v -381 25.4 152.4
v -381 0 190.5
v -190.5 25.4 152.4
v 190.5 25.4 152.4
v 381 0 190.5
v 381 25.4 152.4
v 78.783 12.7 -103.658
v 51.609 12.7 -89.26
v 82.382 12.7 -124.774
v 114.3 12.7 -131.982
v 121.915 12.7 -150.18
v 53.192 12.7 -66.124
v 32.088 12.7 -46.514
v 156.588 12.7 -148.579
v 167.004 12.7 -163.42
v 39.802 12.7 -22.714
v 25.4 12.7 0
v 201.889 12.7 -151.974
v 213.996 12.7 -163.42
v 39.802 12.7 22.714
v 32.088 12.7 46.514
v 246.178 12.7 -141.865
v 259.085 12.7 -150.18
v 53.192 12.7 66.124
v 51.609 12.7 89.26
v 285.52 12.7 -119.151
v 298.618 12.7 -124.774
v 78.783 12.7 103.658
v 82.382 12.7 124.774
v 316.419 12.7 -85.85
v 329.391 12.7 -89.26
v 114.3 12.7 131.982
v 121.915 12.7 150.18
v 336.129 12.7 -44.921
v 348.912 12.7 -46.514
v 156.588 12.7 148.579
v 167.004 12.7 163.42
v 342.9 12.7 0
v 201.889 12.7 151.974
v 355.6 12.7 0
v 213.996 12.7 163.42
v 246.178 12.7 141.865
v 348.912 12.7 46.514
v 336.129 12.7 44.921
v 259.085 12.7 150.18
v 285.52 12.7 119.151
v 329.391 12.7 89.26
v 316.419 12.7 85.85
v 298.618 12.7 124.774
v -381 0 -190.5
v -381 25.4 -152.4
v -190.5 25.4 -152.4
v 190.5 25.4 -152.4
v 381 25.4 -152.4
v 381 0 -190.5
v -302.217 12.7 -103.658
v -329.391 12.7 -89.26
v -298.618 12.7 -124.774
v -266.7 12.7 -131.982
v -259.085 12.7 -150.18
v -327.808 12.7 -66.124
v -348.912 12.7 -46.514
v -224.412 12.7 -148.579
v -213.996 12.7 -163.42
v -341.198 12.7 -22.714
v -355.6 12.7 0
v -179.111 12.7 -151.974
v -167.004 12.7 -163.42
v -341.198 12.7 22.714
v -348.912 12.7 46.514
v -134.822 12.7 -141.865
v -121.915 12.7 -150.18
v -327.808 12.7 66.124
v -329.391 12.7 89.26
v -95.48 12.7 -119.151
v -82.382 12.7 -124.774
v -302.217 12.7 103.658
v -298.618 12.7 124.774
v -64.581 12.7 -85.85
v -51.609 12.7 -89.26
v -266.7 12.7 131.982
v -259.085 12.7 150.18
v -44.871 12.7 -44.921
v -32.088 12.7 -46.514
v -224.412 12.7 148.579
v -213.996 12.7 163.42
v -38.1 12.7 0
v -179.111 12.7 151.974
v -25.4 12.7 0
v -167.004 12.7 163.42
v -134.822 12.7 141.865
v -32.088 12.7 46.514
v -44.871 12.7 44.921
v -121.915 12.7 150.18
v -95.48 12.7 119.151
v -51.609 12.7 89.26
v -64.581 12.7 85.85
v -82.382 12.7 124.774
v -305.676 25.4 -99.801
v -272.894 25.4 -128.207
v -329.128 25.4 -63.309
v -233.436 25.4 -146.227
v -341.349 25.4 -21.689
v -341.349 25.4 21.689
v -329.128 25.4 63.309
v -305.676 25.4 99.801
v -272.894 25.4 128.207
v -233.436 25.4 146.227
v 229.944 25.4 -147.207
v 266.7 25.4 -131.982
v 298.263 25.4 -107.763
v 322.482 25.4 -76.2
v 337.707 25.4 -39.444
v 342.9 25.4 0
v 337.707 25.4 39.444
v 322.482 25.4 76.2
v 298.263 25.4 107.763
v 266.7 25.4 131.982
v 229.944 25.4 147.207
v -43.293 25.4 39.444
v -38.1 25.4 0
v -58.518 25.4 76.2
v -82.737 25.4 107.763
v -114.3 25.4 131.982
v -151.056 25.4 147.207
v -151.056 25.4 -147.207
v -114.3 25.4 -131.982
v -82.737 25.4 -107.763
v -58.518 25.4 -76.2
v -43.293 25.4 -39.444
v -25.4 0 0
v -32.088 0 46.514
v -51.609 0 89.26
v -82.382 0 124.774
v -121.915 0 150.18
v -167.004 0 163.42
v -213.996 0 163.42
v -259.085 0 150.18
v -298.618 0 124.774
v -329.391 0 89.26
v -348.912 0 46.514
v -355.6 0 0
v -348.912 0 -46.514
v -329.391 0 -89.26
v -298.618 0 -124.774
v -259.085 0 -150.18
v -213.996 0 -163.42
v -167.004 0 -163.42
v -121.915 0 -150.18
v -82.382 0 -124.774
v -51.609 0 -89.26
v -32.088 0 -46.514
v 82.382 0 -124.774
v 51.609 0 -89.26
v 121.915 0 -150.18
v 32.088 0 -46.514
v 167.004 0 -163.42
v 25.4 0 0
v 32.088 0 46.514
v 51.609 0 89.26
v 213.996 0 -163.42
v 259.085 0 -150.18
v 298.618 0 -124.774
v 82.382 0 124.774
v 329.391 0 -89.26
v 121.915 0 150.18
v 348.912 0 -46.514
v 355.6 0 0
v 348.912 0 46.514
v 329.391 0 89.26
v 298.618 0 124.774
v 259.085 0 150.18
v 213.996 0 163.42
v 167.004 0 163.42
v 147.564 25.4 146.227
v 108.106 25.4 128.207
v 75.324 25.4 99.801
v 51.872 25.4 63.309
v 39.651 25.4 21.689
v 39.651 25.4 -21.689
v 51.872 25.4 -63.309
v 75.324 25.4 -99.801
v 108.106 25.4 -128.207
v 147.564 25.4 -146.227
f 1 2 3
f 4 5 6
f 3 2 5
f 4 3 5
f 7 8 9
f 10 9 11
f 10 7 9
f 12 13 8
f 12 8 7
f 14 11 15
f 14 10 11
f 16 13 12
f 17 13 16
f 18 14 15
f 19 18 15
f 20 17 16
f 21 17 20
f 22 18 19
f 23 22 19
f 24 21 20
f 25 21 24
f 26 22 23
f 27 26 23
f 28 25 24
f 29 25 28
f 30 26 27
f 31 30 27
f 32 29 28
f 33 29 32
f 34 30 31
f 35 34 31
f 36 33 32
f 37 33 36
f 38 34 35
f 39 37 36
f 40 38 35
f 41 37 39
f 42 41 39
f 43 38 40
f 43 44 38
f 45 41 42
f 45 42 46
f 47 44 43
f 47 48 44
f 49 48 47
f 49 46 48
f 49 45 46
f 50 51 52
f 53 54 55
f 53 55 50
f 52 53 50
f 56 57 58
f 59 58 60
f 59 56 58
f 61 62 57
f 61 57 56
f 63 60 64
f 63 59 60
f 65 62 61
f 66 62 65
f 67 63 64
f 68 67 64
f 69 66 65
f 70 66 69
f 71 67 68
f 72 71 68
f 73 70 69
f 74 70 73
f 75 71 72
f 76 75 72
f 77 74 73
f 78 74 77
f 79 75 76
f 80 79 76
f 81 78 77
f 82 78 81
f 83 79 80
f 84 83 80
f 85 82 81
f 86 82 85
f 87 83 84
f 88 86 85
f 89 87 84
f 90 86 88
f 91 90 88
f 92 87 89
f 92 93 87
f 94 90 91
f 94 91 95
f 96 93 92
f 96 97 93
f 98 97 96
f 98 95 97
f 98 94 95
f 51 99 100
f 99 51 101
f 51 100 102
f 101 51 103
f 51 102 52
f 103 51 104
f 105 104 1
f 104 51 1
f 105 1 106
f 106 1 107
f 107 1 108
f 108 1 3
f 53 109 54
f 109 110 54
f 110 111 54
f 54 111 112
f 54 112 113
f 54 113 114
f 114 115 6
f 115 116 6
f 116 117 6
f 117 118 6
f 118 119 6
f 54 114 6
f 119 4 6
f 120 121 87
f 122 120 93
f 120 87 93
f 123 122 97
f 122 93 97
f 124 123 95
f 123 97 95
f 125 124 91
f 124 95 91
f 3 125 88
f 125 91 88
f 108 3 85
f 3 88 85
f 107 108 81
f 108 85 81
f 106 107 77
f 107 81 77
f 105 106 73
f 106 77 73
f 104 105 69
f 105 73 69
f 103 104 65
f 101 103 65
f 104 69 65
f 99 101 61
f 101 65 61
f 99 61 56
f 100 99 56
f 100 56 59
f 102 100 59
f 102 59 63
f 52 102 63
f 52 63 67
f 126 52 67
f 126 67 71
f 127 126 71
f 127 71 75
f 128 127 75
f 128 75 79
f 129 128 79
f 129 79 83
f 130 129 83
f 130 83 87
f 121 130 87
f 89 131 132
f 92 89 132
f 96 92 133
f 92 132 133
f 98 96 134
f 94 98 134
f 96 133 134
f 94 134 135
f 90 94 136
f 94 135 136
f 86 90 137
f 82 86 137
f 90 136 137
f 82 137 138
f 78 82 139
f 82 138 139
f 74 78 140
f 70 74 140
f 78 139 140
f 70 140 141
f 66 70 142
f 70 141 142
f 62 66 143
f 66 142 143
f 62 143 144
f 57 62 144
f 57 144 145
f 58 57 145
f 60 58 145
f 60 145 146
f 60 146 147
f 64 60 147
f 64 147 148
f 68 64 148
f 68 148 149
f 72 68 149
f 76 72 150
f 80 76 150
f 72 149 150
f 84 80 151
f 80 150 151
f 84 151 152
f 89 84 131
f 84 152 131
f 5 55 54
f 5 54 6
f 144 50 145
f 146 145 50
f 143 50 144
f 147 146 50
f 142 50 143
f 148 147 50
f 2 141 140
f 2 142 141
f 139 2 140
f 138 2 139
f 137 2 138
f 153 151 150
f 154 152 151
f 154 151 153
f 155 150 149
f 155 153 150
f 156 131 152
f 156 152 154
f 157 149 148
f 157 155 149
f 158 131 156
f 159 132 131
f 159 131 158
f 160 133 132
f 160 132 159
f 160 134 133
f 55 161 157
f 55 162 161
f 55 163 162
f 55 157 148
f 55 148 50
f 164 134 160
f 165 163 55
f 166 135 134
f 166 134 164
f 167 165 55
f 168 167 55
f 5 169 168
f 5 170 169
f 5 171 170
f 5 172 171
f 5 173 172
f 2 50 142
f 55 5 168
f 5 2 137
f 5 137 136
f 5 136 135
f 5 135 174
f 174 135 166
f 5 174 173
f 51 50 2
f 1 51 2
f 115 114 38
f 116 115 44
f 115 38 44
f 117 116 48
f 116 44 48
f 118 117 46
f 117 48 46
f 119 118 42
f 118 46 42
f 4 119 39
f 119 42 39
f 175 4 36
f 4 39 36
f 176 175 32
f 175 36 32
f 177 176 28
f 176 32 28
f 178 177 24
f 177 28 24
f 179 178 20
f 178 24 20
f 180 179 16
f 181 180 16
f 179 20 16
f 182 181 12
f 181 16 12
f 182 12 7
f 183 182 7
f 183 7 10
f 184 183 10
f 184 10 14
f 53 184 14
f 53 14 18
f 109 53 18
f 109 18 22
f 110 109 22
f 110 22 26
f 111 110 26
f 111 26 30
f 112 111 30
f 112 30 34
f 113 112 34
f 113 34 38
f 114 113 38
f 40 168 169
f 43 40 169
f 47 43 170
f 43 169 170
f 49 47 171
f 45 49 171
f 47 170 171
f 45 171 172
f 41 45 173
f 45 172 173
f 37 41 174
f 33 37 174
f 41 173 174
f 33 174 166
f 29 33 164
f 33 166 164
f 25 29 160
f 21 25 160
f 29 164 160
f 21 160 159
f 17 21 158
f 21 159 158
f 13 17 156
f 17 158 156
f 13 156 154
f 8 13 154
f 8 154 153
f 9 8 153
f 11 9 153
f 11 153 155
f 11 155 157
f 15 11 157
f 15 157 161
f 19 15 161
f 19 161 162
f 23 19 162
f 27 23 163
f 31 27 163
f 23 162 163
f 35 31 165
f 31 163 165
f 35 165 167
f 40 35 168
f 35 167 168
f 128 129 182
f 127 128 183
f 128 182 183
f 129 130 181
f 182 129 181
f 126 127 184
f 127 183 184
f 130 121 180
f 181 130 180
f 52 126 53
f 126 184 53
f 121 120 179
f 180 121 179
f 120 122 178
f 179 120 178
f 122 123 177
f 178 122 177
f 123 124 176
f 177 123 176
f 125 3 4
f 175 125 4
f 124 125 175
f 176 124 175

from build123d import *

# Parameters (mm, degrees)
F0_W     = 762
F0_H     = 381
F1_DEPTH = 25.4
F2_R     = 165.1
F3_DEPTH = 12.7
F4_R     = 152.4
F5_DEPTH = 25.4
F7_DEPTH = 762


with BuildPart() as f1:
    # F0 (on Front) → F1 (new body)
    with BuildSketch(Plane.XZ):
        Rectangle(F0_W, F0_H)
    extrude(amount=-F1_DEPTH)

    # F2 (on face) → F3 (cut)
    with BuildSketch(Plane.XZ):
        with Locations((-190.5, 0)):
            Circle(F2_R)
        with Locations((190.5, 0)):
            Circle(F2_R)
    extrude(amount=-F3_DEPTH, mode=Mode.SUBTRACT)

    # F4 (on face) → F5 (cut)
    with BuildSketch(Plane.XZ.offset(-12.7)):
        with Locations((-190.5, 0)):
            Circle(F4_R)
        with Locations((190.5, 0)):
            Circle(F4_R)
    extrude(amount=-F5_DEPTH, mode=Mode.SUBTRACT)

    # F6 (on face) → F7 (cut)
    with BuildSketch(Plane.YZ.offset(381)):
        Polygon((0, -190.5), (25.4, -190.5), (25.4, -152.4), align=None)
        Polygon((25.4, 190.5), (0, 190.5), (25.4, 152.4), align=None)
    extrude(amount=-F7_DEPTH, mode=Mode.SUBTRACT)


solid = f1.part
